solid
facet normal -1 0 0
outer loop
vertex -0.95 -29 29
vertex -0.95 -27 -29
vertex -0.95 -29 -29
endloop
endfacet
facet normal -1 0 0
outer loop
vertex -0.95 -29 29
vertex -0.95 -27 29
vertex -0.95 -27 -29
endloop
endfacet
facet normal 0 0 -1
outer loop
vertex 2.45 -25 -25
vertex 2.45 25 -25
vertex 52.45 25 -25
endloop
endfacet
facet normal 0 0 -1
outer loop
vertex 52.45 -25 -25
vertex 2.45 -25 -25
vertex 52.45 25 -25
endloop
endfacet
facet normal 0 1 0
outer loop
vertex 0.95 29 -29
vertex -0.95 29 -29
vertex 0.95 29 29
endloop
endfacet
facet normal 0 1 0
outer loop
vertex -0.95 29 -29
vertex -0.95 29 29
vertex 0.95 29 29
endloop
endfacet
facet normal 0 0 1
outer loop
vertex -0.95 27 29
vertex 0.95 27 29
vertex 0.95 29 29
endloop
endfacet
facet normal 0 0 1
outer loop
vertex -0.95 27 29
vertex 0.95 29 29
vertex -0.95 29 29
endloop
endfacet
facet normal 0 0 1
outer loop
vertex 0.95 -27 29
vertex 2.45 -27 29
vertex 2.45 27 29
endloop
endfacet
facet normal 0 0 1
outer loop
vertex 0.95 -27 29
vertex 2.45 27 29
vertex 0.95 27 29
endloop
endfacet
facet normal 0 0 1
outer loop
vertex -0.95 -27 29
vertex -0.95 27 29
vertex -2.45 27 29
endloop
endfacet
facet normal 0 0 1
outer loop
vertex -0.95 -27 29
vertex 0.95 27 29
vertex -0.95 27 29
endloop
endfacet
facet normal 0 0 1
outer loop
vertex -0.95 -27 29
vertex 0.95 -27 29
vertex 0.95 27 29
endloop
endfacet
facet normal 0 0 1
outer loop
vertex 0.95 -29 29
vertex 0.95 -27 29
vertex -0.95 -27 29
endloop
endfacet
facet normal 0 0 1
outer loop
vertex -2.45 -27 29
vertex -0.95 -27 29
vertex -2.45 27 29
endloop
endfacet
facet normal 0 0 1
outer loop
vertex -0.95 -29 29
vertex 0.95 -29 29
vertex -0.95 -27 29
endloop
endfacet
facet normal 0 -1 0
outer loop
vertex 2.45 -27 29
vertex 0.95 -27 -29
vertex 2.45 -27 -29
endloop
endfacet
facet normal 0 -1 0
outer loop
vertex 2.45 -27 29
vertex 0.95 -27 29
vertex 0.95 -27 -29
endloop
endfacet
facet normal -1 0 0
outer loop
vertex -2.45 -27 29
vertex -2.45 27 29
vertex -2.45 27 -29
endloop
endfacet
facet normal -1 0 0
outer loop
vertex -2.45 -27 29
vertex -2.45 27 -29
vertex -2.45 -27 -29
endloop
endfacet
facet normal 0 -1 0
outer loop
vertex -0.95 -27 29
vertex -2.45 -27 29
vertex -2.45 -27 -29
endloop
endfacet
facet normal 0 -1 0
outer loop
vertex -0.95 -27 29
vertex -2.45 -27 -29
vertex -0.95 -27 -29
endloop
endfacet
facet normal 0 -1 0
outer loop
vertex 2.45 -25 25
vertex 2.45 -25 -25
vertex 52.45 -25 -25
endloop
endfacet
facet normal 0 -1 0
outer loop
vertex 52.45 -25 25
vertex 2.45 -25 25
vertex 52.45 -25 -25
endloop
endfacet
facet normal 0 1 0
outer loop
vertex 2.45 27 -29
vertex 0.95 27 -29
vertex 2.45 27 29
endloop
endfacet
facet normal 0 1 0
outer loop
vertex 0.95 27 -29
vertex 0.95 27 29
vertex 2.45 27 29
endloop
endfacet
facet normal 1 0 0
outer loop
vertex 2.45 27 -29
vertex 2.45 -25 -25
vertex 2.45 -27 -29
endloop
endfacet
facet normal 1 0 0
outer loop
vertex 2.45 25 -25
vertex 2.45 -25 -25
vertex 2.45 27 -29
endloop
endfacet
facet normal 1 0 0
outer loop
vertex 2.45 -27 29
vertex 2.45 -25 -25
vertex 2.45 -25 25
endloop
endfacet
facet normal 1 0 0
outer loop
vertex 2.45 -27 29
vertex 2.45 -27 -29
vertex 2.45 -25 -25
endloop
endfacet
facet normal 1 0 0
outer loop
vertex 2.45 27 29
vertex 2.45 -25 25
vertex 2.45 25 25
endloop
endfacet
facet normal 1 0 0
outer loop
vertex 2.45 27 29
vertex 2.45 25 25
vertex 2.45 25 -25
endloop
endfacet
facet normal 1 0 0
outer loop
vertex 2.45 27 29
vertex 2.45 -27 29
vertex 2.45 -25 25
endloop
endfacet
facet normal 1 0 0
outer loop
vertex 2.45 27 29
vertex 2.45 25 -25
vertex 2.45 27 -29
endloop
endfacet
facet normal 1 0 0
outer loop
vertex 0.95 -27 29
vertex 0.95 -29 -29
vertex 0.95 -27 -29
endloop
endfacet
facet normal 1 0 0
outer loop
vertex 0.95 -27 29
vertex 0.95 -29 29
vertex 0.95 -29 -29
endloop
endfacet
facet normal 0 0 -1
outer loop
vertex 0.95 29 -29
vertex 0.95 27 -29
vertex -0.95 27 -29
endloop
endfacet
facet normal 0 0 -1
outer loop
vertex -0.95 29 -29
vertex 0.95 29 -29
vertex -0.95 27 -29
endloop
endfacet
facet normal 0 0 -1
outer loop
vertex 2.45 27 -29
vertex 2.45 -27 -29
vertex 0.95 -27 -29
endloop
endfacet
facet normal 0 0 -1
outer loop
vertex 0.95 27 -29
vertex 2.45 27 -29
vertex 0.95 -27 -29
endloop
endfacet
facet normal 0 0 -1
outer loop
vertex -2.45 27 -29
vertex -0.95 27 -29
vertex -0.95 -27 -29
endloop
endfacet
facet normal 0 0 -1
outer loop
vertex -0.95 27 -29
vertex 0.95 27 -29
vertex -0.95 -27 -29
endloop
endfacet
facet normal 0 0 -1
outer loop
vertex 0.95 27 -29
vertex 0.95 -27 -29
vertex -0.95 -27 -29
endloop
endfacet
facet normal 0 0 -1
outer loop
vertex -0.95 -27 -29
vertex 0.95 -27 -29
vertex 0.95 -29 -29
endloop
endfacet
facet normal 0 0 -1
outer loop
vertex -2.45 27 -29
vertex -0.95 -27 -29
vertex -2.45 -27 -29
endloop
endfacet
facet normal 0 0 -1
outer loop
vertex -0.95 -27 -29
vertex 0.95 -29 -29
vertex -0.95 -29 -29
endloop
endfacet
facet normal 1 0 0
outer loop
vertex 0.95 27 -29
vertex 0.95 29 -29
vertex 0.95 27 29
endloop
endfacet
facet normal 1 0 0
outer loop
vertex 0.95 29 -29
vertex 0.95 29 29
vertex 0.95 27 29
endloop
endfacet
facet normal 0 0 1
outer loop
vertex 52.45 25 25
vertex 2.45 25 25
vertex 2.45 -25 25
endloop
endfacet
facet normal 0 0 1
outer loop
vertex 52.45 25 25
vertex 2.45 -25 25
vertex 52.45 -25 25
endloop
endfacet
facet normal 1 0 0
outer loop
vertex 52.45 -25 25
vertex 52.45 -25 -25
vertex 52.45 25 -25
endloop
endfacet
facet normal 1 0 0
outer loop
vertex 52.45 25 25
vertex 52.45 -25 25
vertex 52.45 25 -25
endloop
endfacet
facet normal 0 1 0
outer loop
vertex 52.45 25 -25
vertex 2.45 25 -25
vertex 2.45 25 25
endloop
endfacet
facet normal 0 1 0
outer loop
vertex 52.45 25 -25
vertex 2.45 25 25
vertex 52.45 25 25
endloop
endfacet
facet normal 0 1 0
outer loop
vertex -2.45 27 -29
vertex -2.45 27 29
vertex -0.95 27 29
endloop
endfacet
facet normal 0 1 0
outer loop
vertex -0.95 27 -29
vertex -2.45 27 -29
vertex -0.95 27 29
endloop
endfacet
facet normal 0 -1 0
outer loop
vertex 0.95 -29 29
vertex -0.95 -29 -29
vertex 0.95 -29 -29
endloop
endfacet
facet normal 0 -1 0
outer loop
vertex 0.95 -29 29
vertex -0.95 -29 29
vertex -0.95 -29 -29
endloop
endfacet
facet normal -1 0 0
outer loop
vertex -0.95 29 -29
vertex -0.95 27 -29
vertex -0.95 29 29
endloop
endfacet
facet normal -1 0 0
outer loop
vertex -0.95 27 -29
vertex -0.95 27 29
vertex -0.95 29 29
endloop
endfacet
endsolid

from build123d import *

# Parameters (mm, degrees)
BOX_W     = 50
BOX_H     = 50
BOX_DEPTH = 50
PAD_DEPTH = 29


with BuildPart() as cube:
    # Box → Box (new body)
    with BuildSketch(Plane(origin=(2.45, -25, -25), x_dir=(1, 0, 0), z_dir=(0, 0, 1))):
        with Locations((25, 25)):
            Rectangle(BOX_W, BOX_H)
    extrude(amount=BOX_DEPTH)


with BuildPart() as fusion:
    # Sketch → Pad (new body, symmetric)
    with BuildSketch(Plane.XY):
        Polygon((-2.45, 27), (-0.95, 27), (-0.95, 29), (0.95, 29), (0.95, 27), (2.45, 27), (2.45, 0), (-2.45, 0), align=None)
    pad = extrude(amount=PAD_DEPTH, both=True)

    # Mirrored: Pad across XZ
    add(pad.mirror(Plane.XZ))

    # Fusion: union Cube
    add(cube.part)


solid = fusion.part
